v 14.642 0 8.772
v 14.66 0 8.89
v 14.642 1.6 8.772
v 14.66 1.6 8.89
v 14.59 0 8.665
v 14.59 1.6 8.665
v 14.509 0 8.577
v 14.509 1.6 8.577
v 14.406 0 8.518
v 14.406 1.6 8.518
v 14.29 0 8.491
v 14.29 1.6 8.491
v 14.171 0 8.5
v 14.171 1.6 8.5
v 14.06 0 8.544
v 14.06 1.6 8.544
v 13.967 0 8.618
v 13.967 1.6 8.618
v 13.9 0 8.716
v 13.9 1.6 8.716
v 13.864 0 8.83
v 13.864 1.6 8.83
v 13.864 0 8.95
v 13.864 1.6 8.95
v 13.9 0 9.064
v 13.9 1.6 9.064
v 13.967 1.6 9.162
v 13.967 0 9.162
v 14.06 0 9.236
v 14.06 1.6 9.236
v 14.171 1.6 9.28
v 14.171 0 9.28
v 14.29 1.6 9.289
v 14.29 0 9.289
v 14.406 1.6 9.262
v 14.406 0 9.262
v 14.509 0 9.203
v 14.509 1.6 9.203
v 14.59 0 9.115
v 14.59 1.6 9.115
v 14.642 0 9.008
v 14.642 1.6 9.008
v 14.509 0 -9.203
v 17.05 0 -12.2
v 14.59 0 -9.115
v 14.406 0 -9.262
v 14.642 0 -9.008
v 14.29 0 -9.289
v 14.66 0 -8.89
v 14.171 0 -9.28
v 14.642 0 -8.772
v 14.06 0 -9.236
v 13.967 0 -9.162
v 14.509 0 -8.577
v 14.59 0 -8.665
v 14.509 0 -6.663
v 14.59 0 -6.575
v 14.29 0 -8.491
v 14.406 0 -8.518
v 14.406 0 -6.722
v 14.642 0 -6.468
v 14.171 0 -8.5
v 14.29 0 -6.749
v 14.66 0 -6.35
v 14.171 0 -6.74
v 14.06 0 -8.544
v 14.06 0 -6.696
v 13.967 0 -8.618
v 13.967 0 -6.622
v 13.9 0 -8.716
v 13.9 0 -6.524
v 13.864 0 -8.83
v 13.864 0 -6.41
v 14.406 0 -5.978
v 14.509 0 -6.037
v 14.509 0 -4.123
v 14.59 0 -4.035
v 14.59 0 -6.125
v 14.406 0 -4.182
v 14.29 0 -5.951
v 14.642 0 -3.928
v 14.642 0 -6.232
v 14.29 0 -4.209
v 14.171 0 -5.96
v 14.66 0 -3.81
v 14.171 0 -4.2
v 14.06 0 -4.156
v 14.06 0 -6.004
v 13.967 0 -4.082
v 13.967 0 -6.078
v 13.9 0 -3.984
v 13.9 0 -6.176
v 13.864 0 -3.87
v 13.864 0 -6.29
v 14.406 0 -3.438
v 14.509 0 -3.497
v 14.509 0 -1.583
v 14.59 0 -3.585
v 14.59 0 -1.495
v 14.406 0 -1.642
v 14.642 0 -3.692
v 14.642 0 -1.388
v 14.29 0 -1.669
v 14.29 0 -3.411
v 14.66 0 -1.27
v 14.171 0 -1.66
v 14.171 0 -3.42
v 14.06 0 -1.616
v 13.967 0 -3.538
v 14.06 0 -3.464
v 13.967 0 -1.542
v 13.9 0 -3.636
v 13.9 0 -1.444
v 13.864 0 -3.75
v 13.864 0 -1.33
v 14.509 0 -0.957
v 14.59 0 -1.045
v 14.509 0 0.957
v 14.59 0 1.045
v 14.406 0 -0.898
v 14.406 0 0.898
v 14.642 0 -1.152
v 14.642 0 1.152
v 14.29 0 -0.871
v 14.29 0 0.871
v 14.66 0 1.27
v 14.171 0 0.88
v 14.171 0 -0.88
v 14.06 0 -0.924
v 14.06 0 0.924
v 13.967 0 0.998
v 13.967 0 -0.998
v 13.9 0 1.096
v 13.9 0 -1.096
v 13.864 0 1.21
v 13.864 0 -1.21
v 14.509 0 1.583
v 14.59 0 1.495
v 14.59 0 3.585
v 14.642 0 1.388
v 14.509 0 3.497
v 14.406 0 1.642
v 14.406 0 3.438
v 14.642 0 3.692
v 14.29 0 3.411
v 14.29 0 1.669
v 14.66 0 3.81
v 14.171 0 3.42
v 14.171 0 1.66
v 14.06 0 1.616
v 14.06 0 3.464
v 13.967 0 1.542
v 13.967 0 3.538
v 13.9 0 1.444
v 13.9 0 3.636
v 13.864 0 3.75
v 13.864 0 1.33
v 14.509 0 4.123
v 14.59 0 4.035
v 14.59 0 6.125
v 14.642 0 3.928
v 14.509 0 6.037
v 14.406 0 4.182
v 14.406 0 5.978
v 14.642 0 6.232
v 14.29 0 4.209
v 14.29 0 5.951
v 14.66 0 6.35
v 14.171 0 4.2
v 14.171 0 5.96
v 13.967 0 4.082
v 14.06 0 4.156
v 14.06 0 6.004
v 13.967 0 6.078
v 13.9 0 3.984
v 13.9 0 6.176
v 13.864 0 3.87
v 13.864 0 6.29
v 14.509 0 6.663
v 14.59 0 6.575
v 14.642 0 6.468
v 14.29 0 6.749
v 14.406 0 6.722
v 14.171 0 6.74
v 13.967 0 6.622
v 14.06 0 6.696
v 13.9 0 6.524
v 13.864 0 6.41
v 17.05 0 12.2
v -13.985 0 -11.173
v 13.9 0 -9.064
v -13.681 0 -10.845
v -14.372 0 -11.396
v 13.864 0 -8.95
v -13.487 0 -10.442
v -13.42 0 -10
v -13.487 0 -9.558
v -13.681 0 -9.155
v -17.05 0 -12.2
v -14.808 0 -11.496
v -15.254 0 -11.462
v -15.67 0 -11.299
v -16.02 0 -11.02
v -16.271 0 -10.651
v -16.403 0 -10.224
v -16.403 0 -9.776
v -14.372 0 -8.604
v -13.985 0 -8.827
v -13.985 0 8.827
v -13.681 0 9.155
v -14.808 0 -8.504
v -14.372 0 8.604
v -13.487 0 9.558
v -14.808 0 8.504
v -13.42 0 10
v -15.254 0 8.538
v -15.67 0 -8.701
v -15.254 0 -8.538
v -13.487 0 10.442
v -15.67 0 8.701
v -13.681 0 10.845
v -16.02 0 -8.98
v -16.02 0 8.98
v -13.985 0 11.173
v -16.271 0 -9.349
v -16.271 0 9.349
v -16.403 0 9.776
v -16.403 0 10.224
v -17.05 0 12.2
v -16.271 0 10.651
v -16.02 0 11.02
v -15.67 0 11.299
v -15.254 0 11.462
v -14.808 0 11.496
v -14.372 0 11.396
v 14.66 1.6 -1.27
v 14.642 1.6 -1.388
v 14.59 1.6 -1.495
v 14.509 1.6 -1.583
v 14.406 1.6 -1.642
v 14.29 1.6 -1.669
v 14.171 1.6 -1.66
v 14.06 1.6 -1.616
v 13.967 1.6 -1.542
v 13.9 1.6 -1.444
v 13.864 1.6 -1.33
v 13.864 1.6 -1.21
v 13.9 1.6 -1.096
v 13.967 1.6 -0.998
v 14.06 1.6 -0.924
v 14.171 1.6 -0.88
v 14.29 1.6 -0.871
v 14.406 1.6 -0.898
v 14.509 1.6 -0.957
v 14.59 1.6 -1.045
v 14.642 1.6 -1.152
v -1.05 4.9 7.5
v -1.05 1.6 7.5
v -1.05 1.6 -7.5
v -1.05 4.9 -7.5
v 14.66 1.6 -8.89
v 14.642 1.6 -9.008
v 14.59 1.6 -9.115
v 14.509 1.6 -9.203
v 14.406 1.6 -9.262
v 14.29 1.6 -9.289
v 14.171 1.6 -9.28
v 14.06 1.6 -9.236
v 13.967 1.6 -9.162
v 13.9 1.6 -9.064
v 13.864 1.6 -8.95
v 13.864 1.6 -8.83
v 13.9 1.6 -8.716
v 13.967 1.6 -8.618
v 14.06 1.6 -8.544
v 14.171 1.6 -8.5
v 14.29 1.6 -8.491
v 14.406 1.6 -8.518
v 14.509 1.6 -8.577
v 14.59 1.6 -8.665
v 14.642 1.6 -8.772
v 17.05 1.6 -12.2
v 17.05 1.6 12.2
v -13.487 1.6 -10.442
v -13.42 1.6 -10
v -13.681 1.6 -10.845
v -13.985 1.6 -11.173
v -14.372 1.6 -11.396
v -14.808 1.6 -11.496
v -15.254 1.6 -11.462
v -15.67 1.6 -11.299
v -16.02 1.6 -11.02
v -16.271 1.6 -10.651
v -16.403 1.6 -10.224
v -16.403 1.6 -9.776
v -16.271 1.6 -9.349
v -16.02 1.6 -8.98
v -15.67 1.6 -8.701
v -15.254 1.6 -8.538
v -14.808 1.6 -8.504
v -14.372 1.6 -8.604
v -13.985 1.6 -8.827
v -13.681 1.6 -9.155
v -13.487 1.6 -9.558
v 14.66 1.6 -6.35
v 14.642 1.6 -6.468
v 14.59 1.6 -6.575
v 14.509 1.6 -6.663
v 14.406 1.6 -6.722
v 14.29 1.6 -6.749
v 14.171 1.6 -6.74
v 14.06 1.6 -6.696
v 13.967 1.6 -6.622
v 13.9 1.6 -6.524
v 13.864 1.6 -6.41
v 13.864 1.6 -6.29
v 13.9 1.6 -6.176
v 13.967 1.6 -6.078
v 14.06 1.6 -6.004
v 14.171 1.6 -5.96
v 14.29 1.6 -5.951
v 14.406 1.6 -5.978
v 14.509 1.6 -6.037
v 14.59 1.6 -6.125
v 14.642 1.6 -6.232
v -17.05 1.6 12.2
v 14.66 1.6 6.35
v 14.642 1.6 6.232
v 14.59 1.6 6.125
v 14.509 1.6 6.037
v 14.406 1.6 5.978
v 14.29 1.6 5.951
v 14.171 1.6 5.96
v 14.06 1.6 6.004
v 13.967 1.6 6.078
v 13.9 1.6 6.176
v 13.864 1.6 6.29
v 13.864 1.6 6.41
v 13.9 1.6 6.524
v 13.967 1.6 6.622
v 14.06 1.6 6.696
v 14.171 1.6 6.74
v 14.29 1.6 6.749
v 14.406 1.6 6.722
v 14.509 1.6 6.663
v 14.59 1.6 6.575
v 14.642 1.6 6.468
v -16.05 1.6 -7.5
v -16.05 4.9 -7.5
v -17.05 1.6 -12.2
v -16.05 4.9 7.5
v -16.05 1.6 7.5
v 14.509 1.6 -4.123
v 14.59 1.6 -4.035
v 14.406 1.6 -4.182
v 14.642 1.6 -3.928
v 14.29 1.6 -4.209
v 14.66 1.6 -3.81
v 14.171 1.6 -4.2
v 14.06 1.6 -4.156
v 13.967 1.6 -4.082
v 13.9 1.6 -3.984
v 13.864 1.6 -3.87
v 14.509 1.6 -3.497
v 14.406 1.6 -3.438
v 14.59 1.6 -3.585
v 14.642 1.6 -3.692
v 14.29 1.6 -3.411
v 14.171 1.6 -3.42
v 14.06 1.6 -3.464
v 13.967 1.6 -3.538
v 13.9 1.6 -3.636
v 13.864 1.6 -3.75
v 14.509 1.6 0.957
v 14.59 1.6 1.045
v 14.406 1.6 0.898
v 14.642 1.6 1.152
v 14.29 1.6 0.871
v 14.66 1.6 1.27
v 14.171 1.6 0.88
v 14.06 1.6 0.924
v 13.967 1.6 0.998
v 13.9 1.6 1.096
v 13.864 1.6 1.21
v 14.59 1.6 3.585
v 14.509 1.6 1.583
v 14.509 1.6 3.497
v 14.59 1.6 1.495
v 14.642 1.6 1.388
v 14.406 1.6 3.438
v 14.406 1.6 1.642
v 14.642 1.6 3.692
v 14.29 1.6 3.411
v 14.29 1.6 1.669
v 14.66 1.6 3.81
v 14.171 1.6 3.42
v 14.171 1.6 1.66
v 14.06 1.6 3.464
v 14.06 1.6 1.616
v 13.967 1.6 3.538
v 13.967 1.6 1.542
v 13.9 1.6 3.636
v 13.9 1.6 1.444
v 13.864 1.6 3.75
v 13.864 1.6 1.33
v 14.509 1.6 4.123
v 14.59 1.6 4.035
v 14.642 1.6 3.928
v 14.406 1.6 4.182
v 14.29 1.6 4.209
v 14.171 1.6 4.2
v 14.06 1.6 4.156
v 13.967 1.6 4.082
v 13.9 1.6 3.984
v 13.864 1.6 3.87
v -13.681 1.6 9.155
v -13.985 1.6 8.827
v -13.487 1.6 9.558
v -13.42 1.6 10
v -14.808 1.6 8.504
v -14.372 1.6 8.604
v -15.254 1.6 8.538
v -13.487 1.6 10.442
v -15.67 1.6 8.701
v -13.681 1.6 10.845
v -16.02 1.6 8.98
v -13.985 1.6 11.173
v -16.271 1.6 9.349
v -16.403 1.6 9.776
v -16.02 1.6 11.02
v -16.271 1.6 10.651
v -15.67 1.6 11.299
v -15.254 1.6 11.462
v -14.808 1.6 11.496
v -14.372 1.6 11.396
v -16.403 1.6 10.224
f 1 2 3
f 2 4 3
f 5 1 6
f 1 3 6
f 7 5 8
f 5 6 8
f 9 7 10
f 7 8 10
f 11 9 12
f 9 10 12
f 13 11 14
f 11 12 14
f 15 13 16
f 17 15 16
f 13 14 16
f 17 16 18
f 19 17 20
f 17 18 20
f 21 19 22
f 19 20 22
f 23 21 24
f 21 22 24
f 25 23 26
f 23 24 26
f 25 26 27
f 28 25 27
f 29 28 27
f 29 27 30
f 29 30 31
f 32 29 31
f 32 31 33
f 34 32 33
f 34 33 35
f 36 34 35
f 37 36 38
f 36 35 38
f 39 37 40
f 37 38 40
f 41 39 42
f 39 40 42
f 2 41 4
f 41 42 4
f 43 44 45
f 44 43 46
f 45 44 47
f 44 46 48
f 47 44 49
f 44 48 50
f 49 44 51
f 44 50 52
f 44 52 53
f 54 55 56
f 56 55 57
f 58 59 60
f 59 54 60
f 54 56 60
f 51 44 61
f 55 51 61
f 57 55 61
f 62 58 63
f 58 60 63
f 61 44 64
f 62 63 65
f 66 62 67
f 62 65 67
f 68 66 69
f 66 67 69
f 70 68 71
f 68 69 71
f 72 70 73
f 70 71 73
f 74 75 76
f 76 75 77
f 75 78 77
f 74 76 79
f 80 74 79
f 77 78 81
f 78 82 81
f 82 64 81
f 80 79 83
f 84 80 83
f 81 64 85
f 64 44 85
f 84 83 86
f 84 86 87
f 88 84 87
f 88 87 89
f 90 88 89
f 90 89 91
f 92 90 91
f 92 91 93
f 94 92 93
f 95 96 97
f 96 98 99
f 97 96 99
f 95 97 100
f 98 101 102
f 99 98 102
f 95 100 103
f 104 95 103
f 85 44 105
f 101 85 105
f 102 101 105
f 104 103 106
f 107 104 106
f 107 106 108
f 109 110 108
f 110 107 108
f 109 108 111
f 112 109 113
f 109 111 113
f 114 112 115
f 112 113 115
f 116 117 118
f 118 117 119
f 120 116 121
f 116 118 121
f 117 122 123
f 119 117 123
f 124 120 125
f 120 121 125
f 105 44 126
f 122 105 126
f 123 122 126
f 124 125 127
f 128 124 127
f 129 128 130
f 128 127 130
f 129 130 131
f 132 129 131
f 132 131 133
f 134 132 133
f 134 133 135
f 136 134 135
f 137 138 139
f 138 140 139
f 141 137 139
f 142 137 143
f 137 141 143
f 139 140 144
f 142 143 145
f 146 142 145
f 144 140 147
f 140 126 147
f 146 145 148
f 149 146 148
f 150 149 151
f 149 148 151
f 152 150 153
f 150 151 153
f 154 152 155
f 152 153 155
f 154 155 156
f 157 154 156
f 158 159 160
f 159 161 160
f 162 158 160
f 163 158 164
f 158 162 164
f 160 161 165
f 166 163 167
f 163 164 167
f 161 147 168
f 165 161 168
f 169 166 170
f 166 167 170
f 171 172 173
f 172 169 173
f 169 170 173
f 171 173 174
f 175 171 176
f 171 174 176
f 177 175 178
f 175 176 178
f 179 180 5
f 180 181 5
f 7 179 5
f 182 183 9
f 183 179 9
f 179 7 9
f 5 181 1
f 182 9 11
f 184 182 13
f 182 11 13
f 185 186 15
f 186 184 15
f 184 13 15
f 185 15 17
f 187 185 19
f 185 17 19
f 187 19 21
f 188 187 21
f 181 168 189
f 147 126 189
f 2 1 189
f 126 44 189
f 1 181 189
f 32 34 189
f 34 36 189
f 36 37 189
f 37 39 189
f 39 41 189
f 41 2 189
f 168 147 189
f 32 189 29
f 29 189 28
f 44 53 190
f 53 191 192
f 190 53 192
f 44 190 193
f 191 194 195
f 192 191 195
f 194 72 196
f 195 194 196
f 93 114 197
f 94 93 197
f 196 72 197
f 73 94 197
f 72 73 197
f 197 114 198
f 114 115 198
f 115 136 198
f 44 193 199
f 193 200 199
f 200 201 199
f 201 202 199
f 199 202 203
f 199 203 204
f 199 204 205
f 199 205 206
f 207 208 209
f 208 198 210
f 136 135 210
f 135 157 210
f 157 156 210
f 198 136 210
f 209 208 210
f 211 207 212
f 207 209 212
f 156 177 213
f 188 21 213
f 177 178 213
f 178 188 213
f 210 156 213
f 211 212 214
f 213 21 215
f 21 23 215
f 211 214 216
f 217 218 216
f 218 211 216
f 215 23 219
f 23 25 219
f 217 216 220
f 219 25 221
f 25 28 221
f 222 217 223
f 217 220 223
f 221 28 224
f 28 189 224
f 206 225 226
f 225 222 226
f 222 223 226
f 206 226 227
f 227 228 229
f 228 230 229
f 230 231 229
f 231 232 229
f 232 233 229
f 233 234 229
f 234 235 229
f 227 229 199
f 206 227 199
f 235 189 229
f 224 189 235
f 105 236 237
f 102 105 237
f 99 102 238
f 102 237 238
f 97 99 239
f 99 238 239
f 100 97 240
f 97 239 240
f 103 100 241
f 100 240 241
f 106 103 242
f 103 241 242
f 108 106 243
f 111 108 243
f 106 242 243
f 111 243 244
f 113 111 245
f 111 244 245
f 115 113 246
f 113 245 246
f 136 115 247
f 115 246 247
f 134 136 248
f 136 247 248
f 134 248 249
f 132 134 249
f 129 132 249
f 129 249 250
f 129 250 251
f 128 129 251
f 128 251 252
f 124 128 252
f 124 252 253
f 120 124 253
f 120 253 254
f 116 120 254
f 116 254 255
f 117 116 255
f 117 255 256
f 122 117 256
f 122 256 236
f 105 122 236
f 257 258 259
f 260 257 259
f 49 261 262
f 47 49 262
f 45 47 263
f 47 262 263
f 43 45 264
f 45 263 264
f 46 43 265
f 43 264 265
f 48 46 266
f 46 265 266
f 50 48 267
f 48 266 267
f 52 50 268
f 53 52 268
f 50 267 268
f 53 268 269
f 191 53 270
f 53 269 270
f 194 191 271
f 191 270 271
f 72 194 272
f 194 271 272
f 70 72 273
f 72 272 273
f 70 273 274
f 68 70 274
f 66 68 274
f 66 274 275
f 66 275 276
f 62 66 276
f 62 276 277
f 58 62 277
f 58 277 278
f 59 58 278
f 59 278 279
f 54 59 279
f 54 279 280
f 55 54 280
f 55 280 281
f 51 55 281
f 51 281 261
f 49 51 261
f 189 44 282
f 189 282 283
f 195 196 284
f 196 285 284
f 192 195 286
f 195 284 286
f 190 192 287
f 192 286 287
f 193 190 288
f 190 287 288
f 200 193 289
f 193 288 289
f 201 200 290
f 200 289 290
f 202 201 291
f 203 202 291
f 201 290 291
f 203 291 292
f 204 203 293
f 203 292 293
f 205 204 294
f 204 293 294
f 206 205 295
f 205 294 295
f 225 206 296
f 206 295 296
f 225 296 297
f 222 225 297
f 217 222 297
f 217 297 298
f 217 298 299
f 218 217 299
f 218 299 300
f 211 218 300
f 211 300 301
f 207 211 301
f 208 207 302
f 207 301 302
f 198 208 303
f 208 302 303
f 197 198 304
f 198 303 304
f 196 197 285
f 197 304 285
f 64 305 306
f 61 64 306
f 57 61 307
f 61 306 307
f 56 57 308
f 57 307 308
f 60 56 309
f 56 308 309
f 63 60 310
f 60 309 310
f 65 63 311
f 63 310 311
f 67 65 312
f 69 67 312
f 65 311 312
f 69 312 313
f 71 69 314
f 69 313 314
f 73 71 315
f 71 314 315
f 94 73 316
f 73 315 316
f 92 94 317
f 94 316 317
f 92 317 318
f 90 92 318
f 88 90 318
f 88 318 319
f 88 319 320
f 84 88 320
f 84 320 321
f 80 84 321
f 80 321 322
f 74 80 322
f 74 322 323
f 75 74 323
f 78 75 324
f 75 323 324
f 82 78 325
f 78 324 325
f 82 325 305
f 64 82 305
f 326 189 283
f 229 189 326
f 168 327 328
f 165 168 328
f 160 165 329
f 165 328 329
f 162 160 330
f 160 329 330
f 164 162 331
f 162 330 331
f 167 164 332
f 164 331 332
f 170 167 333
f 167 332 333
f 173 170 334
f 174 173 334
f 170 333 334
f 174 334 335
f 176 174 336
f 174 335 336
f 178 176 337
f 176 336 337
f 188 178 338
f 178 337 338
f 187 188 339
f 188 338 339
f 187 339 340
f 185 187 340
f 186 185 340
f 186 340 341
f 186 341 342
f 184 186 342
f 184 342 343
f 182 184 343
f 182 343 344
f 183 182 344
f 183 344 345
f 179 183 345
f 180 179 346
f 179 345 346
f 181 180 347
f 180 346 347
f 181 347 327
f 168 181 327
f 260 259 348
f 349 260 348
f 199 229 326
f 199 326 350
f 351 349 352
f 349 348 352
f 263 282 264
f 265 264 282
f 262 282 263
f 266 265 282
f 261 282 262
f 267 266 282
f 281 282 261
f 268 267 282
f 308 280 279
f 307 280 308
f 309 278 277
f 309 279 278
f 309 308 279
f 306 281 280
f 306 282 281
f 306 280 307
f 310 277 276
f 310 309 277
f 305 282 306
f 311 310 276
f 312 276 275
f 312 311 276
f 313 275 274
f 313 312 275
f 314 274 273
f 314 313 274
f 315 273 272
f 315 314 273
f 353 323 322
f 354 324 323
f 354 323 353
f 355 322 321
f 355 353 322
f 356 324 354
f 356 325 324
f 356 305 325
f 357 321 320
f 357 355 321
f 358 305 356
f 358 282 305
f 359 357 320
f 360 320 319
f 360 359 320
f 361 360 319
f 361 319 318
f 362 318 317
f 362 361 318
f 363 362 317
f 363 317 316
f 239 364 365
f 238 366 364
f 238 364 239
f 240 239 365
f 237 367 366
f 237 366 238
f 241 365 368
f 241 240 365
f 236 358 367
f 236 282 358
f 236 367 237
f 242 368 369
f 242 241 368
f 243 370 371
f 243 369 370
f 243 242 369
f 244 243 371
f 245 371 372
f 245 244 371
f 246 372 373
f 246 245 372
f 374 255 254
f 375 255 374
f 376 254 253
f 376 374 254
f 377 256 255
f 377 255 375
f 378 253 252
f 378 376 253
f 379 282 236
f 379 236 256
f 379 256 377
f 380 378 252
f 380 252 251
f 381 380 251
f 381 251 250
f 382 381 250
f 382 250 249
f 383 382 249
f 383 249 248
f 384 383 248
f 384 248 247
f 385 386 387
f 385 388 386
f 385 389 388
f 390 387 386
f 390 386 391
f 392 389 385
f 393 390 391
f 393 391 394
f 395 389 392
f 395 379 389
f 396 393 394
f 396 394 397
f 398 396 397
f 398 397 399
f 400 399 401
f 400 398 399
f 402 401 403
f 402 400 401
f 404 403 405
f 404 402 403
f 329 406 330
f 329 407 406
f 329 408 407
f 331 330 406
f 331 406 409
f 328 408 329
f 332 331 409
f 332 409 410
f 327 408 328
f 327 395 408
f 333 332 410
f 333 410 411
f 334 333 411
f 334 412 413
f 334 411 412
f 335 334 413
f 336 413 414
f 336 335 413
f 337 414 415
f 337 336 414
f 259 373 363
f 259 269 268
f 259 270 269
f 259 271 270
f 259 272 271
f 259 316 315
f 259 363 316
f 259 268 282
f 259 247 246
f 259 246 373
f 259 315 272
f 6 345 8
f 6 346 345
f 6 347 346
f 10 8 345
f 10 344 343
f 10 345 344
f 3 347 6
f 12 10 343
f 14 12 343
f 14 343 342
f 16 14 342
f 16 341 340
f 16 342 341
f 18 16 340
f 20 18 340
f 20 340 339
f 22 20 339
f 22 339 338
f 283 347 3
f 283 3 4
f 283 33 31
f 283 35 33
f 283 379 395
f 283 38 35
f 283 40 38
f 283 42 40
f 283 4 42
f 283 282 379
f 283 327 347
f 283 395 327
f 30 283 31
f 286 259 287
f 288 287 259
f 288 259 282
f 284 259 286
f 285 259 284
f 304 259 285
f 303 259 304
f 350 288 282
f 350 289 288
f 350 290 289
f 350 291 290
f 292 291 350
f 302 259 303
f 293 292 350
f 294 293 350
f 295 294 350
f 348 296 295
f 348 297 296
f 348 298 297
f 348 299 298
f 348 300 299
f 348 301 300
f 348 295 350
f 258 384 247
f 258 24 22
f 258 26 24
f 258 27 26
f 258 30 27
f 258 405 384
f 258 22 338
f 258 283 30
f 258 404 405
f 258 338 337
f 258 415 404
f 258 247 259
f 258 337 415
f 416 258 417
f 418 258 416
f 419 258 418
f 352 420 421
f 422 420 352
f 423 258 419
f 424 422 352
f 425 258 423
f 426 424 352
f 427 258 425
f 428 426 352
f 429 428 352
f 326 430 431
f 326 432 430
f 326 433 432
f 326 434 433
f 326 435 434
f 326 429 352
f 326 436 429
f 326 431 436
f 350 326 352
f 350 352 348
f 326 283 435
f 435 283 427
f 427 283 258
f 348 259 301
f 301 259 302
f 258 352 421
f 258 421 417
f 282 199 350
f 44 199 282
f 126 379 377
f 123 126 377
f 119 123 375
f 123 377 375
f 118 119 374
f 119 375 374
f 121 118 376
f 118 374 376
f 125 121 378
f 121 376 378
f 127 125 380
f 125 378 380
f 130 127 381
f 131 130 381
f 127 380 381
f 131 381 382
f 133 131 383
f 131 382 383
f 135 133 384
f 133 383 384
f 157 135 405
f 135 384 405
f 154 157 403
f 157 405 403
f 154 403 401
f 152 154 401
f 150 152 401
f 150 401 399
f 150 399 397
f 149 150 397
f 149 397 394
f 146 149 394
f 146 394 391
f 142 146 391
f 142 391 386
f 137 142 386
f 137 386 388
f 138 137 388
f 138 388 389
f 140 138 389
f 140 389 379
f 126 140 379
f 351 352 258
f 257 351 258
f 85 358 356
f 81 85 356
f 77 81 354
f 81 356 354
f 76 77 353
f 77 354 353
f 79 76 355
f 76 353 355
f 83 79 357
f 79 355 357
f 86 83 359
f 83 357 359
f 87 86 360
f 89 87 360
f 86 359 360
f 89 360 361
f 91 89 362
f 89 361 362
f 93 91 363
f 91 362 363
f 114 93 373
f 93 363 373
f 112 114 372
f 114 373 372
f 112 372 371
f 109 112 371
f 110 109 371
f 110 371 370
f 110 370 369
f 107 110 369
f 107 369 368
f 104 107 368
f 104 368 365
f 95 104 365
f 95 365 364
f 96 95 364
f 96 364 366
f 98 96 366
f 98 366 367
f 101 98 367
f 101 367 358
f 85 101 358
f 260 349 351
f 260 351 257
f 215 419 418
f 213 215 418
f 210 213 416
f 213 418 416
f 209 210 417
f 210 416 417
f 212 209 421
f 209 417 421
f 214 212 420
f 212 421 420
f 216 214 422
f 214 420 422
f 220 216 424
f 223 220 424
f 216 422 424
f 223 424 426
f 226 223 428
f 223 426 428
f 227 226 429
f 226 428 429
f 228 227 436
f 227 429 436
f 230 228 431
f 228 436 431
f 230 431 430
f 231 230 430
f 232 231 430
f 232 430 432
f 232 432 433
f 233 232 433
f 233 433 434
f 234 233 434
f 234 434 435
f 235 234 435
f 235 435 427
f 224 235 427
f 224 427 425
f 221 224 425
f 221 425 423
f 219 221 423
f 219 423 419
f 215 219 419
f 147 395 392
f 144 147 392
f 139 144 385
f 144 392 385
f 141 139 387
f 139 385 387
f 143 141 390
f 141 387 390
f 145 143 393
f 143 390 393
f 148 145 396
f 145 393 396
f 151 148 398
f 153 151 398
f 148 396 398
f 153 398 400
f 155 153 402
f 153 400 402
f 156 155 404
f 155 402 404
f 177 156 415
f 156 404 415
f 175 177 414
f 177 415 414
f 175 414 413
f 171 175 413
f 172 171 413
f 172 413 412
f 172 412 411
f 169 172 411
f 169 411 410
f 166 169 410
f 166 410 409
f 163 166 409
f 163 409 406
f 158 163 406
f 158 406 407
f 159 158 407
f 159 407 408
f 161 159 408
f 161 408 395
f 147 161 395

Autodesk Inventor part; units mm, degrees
ref_plane "YZ Plane" through (0, 0, 0) normal (1, 0, 0) x (0, 1, 0)
ref_plane "XZ Plane" through (0, 0, 0) normal (0, 1, 0) x (-1, 0, 0)
ref_plane "XY Plane" through (0, 0, 0) normal (0, 0, 1) x (1, 0, 0)
sketch "Sketch1" plane through (0, 0, 0) normal (0, 1, 0) x (-1, 0, 0)
  line L0 (-17.05, 12.2) -> (17.05, 12.2)
  line L1 (17.05, 12.2) -> (17.05, -12.2)
  line L2 (17.05, -12.2) -> (-17.05, -12.2)
  line L3 (-17.05, -12.2) -> (-17.05, 12.2)
  line L4 (-17.05, 12.2) -> (17.05, -12.2) construction
  line L5 (17.05, 12.2) -> (-17.05, -12.2) construction
  point P0 (0, 0)
  dimension "d0" = 34.1
  dimension "d1" = 24.4
extrude "Extrusion1" add sketch "Sketch1" along normal blind 1.6
sketch "Sketch2" plane through (0, 1.6, 0) normal (0, 1, 0) x (1, 0, 0)
  circle A0 centre (-14.92, -10) radius 1.5
  circle A1 centre (-14.92, 10) radius 1.5
  line L0 (-17.05, 12.2) -> (-17.05, -12.2) projected
  line L1 (-17.05, -12.2) -> (17.05, -12.2) projected
  line L2 (17.05, 12.2) -> (-17.05, 12.2) projected
  circle A2 centre (14.26, -6.35) radius 0.4
  circle A3 centre (14.26, -3.81) radius 0.4
  circle A4 centre (14.26, -1.27) radius 0.4
  circle A5 centre (14.26, -8.89) radius 0.4
  circle A6 centre (14.26, 1.27) radius 0.4
  line L3 (17.05, -12.2) -> (17.05, 12.2) projected
  circle A7 centre (14.26, 3.81) radius 0.4
  circle A8 centre (14.26, 6.35) radius 0.4
  circle A9 centre (14.26, 8.89) radius 0.4
  point P0 (0, 0)
  dimension "d4" = 3
  dimension "d5" = 3
  dimension "d6" = 2.13
  dimension "d7" = 2.2
  dimension "d8" = 2.13
  dimension "d9" = 2.2
  dimension "d10" = 0.8
  dimension "d11" = 0.8
  dimension "d12" = 2.54
  dimension "d13" = 0.8
  dimension "d14" = 0.8
  dimension "d15" = 0.8
  dimension "d16" = 2.79
  dimension "d17" = 2.54
  dimension "d18" = 2.79
  dimension "d19" = 2.79
  dimension "d20" = 2.79
  dimension "d21" = 2.54
  dimension "d22" = 2.79
  dimension "d23" = 2.54
  dimension "d24" = 0.8
  dimension "d25" = 0.8
  dimension "d26" = 0.8
  dimension "d27" = 2.79
  dimension "d28" = 2.79
  dimension "d29" = 2.79
  dimension "d30" = 2.54
  dimension "d31" = 2.54
  dimension "d32" = 2.54
  dimension "d33" = 3.31
extrude "Extrusion2" cut sketch "Sketch2" against normal blind 3.31 contours A0 | A1 | A2 | A3 | A4 | A5 | A6 | A7 | A8 | A9
sketch "Sketch3" plane through (0, 1.6, 0) normal (0, 1, 0) x (1, 0, 0)
  line L0 (-16.05, -7.5) -> (-1.05, -7.5)
  line L1 (-1.05, -7.5) -> (-1.05, 7.5)
  line L2 (-1.05, 7.5) -> (-16.05, 7.5)
  line L3 (-16.05, 7.5) -> (-16.05, -7.5)
  line L4 (-16.05, -7.5) -> (-1.05, 7.5) construction
  line L5 (-1.05, -7.5) -> (-16.05, 7.5) construction
  line L6 (-17.05, 12.2) -> (-17.05, -12.2) projected
  point P0 (0, 0)
  point P1 (-8.55, 0)
  dimension "d36" = 15
  dimension "d37" = 15
  dimension "d38" = 1
extrude "Extrusion3" add sketch "Sketch3" along normal blind 3.3
equation "\"d34\" = d33"
properties part number "arducam'"
